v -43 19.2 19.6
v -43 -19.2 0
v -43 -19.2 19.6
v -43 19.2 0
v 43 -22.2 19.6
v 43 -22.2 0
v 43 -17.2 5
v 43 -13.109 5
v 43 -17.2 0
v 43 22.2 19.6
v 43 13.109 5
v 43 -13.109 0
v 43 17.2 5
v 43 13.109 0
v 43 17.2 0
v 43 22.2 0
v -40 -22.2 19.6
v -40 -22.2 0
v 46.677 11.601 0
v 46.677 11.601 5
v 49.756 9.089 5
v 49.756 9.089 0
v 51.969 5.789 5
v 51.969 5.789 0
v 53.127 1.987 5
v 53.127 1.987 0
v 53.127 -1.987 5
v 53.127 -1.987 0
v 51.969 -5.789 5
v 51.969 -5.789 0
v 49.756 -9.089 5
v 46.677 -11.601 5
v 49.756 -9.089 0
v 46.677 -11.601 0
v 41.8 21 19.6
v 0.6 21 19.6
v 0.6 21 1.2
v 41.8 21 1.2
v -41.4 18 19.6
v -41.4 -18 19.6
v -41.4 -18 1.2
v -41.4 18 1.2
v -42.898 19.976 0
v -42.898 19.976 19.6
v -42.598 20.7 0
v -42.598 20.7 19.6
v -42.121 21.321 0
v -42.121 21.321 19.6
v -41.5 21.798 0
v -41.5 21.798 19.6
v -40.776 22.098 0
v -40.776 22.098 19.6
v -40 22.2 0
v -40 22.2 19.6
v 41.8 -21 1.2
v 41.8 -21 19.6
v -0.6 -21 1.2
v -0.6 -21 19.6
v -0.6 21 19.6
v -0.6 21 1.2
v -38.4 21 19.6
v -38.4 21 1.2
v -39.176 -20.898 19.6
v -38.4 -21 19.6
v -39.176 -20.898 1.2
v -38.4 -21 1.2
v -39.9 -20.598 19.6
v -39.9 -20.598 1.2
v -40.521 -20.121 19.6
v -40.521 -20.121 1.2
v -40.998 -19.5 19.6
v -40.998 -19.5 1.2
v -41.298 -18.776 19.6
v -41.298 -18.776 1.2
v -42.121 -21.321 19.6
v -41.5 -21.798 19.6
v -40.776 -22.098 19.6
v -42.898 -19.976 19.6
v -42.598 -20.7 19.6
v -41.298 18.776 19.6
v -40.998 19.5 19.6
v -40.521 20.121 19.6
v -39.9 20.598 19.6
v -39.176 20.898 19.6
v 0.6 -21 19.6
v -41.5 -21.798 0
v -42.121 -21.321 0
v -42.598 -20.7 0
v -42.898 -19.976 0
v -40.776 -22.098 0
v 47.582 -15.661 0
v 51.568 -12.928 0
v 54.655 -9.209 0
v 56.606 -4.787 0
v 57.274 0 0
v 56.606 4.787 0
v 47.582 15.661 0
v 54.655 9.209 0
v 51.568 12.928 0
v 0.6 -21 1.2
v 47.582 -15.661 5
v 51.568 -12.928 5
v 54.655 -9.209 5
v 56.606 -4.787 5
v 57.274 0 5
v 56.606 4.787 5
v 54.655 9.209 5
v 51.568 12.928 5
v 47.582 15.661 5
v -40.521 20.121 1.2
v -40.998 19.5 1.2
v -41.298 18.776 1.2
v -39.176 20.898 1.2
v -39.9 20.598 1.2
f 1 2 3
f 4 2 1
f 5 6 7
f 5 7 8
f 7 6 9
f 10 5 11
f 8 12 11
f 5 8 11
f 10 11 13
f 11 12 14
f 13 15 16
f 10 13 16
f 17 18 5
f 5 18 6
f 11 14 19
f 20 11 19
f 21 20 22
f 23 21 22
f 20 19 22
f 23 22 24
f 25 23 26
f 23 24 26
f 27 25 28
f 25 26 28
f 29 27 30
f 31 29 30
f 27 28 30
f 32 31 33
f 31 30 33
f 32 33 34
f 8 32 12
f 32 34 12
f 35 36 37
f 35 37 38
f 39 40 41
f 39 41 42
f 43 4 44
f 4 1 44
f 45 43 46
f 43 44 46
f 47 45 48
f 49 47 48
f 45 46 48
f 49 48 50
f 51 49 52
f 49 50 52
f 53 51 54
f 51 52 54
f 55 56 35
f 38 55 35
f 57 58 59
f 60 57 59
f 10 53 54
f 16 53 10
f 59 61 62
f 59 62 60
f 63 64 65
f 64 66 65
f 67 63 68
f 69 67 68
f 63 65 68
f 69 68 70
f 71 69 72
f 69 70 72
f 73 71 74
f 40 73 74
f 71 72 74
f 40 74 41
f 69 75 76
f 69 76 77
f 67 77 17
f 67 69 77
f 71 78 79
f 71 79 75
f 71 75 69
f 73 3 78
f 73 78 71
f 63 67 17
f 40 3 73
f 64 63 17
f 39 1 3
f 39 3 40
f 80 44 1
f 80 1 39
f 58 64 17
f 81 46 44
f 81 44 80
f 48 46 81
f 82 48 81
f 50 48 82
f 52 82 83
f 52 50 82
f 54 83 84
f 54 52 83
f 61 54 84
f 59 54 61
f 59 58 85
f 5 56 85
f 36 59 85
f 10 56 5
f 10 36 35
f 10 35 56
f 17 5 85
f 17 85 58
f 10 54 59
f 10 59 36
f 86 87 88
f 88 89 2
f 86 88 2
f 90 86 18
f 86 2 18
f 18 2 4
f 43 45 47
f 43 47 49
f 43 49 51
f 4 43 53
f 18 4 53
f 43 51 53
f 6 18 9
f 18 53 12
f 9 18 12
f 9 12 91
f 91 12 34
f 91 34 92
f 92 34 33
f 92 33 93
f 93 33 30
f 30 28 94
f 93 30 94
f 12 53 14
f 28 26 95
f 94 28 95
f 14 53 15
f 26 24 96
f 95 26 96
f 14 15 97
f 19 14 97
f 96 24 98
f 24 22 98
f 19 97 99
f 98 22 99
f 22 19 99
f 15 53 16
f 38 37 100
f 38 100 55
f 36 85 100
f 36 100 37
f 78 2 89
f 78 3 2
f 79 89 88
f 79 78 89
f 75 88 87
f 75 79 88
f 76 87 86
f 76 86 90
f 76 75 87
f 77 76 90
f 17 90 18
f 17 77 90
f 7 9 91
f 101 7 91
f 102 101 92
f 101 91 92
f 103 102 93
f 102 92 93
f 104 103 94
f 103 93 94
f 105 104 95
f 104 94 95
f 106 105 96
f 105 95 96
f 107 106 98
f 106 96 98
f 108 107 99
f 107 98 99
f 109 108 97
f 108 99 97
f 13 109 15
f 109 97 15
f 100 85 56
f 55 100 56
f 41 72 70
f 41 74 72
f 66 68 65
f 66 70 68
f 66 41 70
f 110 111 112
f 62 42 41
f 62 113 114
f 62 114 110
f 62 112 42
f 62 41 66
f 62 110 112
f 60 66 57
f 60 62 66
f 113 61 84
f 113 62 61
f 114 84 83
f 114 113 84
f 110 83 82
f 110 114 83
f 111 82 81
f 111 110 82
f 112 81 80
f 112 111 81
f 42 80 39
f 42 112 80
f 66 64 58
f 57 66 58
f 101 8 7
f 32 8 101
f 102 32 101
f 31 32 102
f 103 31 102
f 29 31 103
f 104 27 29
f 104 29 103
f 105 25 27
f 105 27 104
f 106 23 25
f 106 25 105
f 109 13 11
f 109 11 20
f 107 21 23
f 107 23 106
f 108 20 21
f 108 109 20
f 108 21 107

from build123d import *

# Parameters (mm, degrees)
SKETCH_1_W          = 86
SKETCH_1_H          = 44.4
EXTRUDE_1_DEPTH     = 19.6
EXTRUDE_2_DEPTH     = 5
SKETCH_3_W          = 40.8
SKETCH_3_H          = 42
SKETCH_3_W_2        = 41.2
CUT_EXTRUDE_1_DEPTH = 18.4
FILLET_1_R          = 3


with BuildPart() as part:
    # Эскиз1 → Бобышка-Вытянуть1 (new body)
    with BuildSketch(Plane.XY):
        Rectangle(SKETCH_1_W, SKETCH_1_H)
    extrude(amount=EXTRUDE_1_DEPTH)

    # Эскиз2 → Бобышка-Вытянуть2 (add)
    with BuildSketch(Plane.XY):
        with BuildLine():
            Line((43, 17.2), (43, 13.108775687))
            ThreePointArc((43, 13.108775687), (53.273546839, 0), (43, -13.108775687))
            Line((43, -13.108775687), (43, -17.2))
            ThreePointArc((43, -17.2), (57.273546839, 0), (43, 17.2))
        make_face()
    extrude(amount=EXTRUDE_2_DEPTH)

    # Эскиз3 → Вырез-Вытянуть1 (cut)
    with BuildSketch(Plane.XY.offset(19.6)):
        with Locations((-21, 0)):
            Rectangle(SKETCH_3_W, SKETCH_3_H)
        with Locations((21.2, 0)):
            Rectangle(SKETCH_3_W_2, SKETCH_3_H)
    extrude(amount=-CUT_EXTRUDE_1_DEPTH, mode=Mode.SUBTRACT)

    # Скругление1
    fillet_1_edges = [part.edges().sort_by_distance(p)[0] for p in [
        (-41.4, -21, 10.4),
        (-41.4, 21, 10.4),
        (-43, -22.2, 9.8),
        (-43, 22.2, 9.8),
    ]]
    fillet(fillet_1_edges, radius=FILLET_1_R)


solid = part.part
